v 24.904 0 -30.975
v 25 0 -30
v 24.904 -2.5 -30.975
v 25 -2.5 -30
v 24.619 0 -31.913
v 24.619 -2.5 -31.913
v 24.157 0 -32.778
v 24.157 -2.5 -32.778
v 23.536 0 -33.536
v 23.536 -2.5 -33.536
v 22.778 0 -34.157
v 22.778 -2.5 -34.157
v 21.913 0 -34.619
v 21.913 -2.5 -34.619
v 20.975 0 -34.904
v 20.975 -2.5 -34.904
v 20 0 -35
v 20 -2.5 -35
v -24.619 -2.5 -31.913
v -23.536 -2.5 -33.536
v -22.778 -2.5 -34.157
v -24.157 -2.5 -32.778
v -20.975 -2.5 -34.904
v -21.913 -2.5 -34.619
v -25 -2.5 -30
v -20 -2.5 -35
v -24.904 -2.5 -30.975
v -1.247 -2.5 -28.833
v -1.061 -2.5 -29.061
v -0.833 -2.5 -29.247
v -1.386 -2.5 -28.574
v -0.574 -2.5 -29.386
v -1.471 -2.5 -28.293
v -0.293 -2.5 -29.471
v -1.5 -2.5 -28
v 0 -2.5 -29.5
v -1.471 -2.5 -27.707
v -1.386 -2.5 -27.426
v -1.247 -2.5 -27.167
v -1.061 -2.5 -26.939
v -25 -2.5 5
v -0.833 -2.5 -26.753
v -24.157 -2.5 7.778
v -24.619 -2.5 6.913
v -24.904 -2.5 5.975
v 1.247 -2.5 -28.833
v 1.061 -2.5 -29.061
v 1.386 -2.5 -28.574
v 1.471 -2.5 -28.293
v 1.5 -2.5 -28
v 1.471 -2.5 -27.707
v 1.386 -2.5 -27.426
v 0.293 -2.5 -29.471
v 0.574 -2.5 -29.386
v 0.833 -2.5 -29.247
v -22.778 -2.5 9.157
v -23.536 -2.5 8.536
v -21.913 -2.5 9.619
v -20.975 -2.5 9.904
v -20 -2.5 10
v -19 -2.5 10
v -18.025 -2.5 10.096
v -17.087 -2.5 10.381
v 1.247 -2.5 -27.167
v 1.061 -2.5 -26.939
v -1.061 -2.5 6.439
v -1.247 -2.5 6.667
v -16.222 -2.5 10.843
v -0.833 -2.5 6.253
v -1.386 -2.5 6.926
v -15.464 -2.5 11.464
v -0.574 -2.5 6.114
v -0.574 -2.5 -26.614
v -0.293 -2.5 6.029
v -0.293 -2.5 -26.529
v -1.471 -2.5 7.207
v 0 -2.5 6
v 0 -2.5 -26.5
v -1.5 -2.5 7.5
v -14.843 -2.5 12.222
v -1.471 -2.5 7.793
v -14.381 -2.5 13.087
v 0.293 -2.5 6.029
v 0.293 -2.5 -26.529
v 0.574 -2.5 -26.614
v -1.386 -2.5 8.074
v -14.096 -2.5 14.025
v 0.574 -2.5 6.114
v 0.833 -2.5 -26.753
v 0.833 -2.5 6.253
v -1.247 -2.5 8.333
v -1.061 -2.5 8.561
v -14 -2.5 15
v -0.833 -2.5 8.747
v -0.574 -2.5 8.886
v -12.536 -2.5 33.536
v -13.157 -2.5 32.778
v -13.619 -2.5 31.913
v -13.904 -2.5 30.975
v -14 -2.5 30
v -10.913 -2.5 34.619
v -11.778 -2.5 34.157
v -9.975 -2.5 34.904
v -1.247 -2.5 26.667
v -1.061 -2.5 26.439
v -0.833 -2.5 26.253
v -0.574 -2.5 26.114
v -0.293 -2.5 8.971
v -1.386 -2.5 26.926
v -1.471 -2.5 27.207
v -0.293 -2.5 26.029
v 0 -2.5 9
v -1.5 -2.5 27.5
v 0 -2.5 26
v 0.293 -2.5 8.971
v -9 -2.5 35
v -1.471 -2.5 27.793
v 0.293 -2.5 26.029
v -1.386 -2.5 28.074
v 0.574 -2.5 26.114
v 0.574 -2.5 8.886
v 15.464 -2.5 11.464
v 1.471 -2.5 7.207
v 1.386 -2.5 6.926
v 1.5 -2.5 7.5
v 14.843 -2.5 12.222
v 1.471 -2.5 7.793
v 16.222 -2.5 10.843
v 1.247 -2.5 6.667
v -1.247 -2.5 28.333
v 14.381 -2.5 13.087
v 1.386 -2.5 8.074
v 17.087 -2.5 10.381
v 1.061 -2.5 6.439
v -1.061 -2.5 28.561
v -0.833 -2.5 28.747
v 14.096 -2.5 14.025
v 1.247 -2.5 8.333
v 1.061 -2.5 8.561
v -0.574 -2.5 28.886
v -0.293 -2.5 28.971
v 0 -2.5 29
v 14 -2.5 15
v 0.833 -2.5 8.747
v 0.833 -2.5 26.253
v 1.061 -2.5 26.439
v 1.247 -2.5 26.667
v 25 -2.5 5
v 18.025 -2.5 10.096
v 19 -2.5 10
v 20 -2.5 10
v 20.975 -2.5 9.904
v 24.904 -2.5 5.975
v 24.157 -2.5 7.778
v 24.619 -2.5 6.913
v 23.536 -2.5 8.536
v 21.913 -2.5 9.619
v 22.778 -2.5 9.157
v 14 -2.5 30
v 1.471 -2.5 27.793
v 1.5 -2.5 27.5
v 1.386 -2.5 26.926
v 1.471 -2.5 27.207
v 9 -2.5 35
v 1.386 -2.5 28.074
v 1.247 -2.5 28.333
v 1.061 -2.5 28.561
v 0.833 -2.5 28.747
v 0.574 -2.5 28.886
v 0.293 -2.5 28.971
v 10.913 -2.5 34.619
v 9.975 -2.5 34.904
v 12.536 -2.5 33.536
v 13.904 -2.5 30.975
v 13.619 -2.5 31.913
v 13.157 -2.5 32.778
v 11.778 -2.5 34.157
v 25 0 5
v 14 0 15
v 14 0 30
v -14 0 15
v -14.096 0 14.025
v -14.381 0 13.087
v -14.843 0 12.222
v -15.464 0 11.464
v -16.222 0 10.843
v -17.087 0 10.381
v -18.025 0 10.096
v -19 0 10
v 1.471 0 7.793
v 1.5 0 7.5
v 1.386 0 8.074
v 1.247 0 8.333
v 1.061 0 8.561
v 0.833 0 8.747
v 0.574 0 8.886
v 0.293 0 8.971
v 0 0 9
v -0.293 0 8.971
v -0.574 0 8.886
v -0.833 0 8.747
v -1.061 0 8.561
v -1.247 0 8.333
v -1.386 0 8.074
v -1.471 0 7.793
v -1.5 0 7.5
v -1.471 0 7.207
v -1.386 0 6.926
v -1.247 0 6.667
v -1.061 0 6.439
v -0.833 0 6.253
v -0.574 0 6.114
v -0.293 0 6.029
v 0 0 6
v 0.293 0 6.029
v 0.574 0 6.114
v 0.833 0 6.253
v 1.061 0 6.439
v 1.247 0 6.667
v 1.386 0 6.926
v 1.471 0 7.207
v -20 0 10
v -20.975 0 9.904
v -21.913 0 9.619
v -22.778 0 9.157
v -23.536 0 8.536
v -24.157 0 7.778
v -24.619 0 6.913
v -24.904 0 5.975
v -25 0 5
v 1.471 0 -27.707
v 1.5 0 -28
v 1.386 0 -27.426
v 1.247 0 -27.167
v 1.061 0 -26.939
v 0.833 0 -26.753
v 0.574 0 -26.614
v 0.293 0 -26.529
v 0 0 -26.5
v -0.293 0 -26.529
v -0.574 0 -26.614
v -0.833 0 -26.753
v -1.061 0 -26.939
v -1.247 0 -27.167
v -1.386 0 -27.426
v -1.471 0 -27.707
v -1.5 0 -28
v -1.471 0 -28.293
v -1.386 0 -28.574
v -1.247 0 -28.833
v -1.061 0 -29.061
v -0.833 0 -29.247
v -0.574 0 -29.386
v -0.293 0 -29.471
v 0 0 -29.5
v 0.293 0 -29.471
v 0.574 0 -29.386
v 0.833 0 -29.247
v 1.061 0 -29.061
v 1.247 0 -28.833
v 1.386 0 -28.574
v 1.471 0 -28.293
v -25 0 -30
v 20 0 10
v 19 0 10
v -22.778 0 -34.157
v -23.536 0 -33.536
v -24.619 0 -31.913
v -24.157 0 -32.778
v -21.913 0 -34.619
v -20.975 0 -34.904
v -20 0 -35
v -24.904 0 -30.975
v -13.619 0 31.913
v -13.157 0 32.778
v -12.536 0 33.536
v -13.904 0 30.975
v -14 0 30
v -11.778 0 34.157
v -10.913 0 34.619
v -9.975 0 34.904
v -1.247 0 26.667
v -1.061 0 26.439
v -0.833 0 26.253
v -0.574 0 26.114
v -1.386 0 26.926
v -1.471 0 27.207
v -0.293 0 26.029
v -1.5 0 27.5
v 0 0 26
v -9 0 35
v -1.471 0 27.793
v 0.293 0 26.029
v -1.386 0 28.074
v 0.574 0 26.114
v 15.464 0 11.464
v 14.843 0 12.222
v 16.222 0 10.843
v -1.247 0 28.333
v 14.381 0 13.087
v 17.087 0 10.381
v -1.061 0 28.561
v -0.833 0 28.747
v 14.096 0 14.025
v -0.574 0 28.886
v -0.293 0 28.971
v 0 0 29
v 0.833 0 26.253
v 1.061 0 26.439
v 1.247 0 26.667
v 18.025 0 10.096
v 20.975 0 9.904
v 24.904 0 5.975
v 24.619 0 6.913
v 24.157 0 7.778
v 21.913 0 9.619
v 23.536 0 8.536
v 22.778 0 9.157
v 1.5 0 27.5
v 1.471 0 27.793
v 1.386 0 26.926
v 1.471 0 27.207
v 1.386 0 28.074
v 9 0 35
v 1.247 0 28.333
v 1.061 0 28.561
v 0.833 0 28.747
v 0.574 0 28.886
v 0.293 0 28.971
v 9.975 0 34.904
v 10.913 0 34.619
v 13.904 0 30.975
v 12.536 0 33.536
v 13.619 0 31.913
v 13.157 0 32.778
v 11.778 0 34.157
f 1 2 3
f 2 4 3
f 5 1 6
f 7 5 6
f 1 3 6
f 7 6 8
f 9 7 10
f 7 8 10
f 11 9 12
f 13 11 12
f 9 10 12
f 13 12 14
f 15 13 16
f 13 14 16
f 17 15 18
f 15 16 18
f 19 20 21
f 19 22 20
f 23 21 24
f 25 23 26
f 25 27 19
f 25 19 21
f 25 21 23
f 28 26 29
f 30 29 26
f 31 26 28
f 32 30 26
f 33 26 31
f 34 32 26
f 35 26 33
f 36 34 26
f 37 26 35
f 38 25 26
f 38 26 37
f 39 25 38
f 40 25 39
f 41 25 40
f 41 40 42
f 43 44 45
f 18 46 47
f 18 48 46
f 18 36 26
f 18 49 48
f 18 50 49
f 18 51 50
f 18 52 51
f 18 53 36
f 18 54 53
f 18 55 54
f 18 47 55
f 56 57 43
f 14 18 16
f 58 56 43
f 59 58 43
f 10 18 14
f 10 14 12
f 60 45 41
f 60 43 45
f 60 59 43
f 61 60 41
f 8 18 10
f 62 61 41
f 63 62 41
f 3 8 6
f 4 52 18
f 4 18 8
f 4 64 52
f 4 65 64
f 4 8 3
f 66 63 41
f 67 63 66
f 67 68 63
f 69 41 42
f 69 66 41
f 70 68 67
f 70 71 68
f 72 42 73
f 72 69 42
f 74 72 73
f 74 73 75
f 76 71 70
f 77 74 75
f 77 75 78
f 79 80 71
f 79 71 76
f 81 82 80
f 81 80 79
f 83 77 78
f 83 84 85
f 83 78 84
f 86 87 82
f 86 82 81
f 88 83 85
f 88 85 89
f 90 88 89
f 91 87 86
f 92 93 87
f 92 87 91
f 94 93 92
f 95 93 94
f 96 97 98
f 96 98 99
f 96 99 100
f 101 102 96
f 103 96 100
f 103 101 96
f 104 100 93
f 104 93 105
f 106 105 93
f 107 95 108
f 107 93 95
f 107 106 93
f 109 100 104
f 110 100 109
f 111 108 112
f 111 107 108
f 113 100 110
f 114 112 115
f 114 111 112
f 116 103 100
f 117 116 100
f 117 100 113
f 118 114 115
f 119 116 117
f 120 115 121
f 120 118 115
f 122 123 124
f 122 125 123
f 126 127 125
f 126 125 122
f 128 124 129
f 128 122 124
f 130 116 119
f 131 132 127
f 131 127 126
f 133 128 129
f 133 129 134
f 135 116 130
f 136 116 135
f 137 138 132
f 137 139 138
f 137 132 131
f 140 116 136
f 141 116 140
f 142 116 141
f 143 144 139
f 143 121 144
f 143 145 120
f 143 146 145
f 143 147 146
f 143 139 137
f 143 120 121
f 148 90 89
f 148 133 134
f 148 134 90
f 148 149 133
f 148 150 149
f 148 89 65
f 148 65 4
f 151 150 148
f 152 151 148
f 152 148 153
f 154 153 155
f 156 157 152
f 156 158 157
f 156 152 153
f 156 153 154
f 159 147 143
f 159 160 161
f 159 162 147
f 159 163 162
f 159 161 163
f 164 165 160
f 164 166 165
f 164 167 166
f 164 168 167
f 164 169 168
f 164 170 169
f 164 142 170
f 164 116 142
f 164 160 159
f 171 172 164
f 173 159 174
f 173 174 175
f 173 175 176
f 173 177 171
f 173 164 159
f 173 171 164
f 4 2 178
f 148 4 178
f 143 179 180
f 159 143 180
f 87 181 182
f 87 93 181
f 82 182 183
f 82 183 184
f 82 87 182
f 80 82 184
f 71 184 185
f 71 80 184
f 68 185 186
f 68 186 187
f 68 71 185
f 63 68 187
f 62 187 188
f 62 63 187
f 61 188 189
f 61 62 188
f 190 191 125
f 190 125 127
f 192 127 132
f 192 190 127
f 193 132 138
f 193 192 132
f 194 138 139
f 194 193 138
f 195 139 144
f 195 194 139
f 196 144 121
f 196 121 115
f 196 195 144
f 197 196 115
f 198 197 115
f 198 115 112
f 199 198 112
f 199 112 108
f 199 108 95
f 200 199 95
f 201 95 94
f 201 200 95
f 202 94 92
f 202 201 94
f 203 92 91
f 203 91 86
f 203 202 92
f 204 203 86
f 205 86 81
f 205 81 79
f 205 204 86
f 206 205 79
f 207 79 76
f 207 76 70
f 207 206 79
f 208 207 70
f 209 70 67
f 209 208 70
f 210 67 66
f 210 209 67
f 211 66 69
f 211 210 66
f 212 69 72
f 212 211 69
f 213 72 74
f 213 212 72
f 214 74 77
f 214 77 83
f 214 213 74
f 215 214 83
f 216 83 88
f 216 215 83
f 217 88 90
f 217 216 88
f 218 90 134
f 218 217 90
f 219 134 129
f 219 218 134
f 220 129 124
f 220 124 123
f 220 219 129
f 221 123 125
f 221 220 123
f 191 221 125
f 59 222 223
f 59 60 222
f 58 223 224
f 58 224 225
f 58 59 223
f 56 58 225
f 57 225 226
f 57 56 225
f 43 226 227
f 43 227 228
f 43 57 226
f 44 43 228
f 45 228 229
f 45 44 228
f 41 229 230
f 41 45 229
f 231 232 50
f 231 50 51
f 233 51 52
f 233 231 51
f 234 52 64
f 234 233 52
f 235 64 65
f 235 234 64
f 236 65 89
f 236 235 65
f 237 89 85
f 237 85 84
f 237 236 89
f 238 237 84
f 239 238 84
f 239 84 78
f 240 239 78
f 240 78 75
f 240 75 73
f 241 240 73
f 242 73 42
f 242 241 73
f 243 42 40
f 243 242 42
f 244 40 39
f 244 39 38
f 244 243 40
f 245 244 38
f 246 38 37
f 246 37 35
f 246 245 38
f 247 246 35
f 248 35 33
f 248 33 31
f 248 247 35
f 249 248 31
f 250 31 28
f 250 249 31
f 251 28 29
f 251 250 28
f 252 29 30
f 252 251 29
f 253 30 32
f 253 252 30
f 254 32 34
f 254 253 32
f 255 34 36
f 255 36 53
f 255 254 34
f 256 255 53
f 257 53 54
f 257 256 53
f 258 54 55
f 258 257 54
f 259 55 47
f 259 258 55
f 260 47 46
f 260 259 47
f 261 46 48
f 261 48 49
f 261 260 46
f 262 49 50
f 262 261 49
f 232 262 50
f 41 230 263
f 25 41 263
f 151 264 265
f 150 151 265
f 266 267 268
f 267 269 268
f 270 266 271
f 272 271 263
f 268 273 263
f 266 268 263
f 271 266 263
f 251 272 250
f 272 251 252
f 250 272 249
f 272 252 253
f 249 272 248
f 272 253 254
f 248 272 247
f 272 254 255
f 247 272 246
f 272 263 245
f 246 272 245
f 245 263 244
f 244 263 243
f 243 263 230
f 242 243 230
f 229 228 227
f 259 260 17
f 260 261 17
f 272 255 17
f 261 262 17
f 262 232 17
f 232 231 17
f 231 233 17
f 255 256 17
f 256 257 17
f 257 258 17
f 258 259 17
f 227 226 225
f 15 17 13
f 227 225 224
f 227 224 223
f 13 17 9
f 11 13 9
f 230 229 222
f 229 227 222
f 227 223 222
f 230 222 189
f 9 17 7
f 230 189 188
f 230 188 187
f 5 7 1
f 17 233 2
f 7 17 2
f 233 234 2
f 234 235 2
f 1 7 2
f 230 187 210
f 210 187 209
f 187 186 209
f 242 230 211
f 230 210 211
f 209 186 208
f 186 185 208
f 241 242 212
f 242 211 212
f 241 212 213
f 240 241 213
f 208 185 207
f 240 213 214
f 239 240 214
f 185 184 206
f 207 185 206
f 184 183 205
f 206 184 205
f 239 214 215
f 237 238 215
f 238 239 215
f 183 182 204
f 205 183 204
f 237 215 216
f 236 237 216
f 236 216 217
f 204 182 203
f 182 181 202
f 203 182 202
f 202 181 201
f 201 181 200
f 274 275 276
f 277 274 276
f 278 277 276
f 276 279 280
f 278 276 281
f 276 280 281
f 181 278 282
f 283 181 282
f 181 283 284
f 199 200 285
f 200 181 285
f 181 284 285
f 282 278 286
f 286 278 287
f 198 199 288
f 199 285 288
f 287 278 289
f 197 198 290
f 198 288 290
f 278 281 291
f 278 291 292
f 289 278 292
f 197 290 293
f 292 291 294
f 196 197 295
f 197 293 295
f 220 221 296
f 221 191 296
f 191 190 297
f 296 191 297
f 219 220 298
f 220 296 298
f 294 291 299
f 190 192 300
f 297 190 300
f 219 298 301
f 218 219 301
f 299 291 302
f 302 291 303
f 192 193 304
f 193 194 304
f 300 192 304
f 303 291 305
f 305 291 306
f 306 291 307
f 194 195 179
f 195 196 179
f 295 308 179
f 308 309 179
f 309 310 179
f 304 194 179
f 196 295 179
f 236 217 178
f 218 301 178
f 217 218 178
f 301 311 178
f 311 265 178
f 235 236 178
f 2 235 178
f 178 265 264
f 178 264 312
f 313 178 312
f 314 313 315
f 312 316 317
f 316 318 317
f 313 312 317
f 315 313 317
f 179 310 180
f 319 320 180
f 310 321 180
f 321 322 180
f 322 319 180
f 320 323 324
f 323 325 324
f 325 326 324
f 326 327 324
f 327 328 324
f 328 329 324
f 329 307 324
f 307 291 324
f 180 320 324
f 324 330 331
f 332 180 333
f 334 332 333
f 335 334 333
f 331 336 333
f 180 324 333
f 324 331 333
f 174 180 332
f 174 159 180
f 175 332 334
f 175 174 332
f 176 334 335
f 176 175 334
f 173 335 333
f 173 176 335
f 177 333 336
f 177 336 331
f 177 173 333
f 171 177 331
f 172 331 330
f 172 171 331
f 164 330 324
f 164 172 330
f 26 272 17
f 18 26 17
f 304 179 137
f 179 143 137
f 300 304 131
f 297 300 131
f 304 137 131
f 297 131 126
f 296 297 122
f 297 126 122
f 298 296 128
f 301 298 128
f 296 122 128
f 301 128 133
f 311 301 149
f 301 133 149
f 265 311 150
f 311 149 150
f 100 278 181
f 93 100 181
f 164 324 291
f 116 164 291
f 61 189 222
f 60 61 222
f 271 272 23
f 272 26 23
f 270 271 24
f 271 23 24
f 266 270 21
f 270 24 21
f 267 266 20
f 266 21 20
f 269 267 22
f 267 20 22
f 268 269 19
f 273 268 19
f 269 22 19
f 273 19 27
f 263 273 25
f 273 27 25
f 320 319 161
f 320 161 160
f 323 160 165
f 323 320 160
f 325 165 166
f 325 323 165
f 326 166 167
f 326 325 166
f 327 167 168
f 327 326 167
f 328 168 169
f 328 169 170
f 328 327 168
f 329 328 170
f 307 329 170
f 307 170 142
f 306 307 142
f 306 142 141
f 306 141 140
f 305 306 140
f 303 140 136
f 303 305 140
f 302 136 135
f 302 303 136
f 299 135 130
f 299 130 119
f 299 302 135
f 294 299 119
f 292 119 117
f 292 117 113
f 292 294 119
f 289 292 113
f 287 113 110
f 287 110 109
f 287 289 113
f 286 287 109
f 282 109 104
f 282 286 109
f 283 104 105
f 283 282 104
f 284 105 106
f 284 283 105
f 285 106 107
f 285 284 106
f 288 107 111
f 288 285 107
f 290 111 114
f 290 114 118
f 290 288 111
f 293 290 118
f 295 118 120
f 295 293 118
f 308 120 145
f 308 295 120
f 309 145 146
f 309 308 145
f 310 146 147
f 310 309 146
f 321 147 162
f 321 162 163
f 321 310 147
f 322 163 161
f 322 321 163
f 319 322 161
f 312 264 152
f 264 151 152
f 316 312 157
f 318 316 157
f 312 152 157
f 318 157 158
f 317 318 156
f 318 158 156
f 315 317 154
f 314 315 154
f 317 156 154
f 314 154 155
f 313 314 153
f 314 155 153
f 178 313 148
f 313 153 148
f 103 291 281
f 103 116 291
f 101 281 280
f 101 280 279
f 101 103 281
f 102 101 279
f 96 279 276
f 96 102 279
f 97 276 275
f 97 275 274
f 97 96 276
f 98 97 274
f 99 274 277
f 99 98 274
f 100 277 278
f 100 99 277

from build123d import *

# Parameters (mm, degrees)
F0_R     = 1.5
F1_DEPTH = 2.5
F2_R     = 5


with BuildPart() as f1:
    # F0 (on Front) → F1 (new body)
    with BuildSketch(Plane.XZ):
        Polygon((14, 10), (14, 35), (-14, 35), (-14, 10), (-25, 10), (-25, -35), (25, -35), (25, 10), align=None)
        with Locations((0, -28)):
            Circle(F0_R, mode=Mode.SUBTRACT)
        with Locations((0, 7.5)):
            Circle(F0_R, mode=Mode.SUBTRACT)
        with Locations((0, 27.5)):
            Circle(F0_R, mode=Mode.SUBTRACT)
    extrude(amount=F1_DEPTH)

    # F2
    f2_edges = [f1.edges().sort_by_distance(p)[0] for p in [
        (-14, -1.25, 10),
        (-25, -1.25, 10),
        (14, -1.25, 10),
        (25, -1.25, 10),
        (-25, -1.25, -35),
        (25, -1.25, -35),
        (14, -1.25, 35),
        (-14, -1.25, 35),
    ]]
    fillet(f2_edges, radius=F2_R)


solid = f1.part
